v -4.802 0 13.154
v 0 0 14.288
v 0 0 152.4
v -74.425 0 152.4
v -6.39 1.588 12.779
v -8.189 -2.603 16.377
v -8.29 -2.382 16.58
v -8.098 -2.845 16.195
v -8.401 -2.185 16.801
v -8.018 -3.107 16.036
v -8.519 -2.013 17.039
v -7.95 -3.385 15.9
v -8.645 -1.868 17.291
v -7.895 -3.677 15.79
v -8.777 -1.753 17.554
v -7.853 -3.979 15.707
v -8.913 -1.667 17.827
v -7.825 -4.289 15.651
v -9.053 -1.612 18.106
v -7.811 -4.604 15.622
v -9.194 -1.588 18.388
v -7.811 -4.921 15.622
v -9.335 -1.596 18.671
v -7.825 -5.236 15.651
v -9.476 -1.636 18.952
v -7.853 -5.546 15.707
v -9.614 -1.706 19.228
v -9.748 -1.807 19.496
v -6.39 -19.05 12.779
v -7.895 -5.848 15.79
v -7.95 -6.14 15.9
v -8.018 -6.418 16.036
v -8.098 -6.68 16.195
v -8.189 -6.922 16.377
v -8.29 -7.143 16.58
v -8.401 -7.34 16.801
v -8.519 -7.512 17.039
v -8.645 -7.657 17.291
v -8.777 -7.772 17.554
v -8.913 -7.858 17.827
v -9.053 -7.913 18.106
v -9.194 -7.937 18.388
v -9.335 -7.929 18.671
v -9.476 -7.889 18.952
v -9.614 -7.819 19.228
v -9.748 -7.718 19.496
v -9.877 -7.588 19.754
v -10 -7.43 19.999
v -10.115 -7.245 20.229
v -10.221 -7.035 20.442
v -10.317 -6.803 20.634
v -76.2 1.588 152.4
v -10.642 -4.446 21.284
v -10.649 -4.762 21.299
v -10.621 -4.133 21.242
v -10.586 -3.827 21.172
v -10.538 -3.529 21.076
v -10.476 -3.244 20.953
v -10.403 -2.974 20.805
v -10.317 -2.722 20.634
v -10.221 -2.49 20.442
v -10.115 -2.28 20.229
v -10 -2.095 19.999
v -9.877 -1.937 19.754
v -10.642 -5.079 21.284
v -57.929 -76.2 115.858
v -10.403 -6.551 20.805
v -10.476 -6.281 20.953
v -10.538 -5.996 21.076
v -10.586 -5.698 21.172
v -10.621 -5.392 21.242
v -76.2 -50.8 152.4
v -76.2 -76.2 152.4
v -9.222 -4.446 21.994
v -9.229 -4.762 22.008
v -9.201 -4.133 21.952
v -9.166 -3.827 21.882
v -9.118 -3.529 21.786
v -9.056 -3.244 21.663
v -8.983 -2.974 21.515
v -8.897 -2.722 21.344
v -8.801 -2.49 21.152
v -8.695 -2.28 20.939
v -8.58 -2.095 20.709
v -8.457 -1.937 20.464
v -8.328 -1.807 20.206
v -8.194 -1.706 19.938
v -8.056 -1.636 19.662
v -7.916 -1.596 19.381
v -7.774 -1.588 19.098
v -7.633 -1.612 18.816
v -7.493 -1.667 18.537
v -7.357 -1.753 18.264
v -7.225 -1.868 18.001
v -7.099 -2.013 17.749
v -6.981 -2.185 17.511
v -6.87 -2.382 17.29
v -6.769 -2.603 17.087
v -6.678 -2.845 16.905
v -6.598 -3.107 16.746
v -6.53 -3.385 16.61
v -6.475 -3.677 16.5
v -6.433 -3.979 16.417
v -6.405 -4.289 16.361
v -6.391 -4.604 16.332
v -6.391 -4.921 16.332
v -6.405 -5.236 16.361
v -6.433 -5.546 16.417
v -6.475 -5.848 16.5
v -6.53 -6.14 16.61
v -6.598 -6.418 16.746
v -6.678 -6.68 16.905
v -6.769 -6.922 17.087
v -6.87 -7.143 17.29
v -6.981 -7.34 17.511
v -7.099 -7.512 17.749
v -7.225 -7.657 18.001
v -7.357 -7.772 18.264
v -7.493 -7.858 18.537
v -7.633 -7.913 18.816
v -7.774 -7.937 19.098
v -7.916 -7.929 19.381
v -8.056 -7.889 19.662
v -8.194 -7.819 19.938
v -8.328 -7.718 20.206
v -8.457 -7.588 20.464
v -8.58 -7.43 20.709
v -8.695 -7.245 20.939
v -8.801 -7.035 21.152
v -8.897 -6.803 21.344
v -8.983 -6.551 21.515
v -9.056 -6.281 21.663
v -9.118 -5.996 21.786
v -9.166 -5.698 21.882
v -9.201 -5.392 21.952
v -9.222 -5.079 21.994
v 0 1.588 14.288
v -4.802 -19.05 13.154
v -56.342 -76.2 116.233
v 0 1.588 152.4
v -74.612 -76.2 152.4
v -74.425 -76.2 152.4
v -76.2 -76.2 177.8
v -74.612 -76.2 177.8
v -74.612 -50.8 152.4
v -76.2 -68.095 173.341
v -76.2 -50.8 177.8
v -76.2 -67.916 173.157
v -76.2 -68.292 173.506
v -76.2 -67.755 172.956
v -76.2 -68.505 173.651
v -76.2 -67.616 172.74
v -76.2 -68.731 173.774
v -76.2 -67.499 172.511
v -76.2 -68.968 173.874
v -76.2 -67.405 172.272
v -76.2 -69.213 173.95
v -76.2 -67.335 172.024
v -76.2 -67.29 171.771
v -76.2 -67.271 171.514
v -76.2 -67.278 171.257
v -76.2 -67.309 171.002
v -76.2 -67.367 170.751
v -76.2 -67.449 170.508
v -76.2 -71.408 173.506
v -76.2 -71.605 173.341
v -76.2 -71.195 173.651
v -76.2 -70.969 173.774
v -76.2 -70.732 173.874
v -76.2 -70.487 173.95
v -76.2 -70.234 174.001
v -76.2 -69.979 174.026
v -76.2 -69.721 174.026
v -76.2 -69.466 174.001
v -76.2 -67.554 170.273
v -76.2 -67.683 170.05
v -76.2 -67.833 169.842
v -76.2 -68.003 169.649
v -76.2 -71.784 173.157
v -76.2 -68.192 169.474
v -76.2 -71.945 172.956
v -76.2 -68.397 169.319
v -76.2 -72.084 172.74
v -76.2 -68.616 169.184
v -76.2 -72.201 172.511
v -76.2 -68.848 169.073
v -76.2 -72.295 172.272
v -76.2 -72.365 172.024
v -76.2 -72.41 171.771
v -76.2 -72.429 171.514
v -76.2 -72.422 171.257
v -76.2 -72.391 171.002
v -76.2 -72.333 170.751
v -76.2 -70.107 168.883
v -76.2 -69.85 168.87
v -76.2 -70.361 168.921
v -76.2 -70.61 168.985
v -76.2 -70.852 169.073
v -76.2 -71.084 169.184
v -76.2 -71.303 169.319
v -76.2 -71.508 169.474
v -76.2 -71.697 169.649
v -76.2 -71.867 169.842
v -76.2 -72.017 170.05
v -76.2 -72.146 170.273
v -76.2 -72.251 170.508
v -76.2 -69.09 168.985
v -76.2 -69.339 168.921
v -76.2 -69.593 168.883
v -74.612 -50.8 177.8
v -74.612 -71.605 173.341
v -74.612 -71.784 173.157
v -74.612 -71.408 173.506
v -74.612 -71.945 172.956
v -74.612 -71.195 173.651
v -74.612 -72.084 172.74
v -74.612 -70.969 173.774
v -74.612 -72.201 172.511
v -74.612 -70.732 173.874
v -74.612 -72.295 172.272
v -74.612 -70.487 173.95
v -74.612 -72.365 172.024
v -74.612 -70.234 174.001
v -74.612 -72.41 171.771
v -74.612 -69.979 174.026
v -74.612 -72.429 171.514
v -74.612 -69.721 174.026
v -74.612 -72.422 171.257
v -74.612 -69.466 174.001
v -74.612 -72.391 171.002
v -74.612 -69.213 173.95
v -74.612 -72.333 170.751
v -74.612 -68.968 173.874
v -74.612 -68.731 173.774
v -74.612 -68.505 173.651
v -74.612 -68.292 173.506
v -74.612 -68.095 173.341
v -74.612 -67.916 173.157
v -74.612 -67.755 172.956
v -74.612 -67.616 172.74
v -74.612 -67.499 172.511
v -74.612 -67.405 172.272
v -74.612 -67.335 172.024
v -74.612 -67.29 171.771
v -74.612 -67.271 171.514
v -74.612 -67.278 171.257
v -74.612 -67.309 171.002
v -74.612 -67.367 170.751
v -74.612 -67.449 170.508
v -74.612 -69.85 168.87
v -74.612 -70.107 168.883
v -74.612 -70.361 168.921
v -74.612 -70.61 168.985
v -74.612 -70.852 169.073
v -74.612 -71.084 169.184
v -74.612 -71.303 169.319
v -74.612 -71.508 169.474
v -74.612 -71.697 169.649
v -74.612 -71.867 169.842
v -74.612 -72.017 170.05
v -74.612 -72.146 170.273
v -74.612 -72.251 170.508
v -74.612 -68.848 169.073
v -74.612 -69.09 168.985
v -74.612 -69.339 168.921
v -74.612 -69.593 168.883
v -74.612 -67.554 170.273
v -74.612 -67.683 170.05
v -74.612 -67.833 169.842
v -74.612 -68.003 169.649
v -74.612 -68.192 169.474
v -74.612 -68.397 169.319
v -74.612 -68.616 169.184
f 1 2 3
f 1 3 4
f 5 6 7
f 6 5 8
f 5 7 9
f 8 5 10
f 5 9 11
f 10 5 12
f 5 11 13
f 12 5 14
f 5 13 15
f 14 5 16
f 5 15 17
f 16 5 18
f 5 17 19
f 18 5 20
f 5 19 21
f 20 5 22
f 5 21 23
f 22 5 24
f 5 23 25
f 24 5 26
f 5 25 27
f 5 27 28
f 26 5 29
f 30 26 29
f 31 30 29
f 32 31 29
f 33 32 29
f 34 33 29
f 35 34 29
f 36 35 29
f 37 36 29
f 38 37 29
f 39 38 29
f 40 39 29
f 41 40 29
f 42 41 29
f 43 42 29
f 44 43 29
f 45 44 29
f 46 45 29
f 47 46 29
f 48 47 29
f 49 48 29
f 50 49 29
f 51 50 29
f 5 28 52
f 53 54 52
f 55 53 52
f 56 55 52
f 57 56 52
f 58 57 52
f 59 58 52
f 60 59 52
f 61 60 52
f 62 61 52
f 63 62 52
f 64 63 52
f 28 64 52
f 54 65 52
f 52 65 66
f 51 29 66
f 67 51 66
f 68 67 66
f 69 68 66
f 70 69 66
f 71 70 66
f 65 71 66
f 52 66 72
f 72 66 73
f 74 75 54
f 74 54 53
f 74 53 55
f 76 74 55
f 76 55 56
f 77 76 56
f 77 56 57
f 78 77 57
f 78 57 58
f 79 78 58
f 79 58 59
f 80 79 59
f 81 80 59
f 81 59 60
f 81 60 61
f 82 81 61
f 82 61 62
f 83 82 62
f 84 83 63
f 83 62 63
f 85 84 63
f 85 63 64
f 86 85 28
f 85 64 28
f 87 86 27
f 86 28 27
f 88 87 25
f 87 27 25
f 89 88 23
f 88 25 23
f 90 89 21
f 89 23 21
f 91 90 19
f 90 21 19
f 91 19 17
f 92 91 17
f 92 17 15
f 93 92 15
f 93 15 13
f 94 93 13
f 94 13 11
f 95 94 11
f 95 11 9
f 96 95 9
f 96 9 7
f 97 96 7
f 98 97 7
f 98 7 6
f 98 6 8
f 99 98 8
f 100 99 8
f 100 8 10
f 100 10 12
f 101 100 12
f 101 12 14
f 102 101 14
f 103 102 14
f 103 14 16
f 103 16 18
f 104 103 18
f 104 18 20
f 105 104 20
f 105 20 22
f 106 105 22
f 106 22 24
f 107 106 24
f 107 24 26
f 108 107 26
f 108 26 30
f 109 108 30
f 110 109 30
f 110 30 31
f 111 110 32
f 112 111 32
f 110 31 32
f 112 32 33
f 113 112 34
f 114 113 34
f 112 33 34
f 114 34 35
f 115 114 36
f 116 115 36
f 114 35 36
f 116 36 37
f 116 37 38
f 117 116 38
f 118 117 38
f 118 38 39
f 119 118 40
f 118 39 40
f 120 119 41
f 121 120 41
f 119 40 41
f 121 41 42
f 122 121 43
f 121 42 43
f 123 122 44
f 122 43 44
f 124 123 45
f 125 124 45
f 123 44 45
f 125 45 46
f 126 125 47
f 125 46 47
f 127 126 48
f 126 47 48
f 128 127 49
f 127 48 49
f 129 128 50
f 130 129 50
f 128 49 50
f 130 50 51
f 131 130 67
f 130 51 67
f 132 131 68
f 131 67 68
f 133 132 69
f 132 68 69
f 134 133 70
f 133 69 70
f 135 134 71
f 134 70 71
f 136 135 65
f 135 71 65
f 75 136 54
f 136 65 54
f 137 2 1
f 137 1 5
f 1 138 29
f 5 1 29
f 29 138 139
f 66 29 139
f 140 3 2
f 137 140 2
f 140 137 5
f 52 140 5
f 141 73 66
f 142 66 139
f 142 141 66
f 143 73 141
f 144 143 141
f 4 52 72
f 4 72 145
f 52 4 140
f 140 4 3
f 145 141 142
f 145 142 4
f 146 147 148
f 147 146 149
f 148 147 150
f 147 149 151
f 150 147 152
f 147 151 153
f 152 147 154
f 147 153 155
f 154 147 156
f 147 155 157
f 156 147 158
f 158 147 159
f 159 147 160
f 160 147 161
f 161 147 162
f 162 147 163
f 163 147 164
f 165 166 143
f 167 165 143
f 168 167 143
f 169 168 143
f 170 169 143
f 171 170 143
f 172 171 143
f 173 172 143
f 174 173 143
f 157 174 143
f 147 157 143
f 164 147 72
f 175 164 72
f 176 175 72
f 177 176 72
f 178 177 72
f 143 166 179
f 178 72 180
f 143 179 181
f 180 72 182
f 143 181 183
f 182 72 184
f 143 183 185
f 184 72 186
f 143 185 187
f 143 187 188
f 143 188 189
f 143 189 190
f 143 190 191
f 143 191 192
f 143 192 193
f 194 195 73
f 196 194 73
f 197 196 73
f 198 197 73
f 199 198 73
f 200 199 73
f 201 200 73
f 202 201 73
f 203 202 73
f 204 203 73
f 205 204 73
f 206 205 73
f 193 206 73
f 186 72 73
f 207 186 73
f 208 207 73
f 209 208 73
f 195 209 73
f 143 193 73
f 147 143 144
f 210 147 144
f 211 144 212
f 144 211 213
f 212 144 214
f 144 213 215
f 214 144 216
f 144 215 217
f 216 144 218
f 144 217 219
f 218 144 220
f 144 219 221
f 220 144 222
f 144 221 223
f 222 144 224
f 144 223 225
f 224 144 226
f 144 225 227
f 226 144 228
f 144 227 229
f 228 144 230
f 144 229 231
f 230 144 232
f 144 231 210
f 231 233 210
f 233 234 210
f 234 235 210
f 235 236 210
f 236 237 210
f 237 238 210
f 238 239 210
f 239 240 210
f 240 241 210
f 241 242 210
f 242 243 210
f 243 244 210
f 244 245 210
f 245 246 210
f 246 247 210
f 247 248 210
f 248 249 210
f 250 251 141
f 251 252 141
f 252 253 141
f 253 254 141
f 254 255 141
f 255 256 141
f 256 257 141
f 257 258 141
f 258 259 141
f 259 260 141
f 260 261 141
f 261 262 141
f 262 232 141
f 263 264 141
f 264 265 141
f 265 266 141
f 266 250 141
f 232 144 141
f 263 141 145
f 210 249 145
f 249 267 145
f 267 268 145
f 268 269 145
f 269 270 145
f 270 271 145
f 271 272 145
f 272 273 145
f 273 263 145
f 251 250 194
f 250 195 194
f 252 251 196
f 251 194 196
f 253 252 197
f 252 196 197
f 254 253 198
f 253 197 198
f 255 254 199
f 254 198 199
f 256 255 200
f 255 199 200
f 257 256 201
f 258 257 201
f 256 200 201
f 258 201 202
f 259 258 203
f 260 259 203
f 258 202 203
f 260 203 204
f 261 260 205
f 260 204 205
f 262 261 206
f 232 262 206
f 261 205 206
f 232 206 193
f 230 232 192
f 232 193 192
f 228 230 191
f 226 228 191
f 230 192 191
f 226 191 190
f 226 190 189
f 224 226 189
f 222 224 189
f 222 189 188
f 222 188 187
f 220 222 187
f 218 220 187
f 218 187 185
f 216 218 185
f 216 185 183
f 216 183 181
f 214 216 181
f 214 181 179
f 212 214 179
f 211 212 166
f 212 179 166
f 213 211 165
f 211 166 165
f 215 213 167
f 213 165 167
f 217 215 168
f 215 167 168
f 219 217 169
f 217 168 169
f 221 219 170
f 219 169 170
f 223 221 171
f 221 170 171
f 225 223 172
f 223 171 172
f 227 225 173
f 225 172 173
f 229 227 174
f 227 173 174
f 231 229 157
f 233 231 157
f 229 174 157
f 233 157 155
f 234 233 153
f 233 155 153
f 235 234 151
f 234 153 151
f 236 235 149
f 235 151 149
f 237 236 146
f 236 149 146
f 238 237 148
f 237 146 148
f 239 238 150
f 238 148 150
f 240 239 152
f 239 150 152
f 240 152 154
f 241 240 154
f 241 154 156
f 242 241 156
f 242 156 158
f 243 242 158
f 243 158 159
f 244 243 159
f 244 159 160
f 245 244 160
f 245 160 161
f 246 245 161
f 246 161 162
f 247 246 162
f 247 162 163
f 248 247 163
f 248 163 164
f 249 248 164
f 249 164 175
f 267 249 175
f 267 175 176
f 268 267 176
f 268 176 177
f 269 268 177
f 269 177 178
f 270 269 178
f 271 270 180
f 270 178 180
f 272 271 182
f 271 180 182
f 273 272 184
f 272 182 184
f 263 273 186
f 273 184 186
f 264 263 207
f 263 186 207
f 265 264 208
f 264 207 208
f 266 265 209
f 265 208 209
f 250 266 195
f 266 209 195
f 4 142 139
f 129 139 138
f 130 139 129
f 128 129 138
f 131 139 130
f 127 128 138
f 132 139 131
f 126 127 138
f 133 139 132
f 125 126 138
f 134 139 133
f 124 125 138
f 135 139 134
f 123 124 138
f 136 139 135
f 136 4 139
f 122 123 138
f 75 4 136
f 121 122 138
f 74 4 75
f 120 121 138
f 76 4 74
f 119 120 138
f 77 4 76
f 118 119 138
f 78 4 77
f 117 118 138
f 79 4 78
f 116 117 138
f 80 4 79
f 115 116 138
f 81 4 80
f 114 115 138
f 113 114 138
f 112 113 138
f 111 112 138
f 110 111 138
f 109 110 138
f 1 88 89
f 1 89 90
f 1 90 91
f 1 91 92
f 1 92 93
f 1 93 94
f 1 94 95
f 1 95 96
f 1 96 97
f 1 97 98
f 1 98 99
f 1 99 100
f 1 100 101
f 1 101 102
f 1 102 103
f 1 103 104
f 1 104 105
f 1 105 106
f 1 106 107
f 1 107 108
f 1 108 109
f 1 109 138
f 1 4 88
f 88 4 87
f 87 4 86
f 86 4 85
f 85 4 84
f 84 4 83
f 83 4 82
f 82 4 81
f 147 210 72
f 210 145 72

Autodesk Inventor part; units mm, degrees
ref_plane "YZ Plane" through (0, 0, 0) normal (1, 0, 0) x (0, 1, 0)
ref_plane "XZ Plane" through (0, 0, 0) normal (0, 1, 0) x (-1, 0, 0)
ref_plane "XY Plane" through (0, 0, 0) normal (0, 0, 1) x (1, 0, 0)
sketch "Sketch1" plane through (0, 0, 0) normal (0, 1, 0) x (-1, 0, 0)
  line L0 (0, 0) -> (76.2, 152.4)
  line L1 (76.2, 152.4) -> (0, 152.4)
  line L2 (0, 152.4) -> (0, 0)
  dimension "d0" = 76.2
  dimension "d1" = 152.4
extrude "Extrusion1" add sketch "Sketch1" along normal blind 1.5875
sketch "Sketch2" plane through (0, 0, 0) normal (0, -1, 0) x (1, 0, 0)
  line L0 (-76.2, 152.4) -> (0, 152.4) projected
  line L1 (-74.4251, 152.4) -> (-3.175, 9.8998)
  line L2 (-3.175, 9.8998) -> (-4.5949, 9.1898)
  line L3 (0, 0) -> (-76.2, 152.4) projected
  line L4 (0, 0) -> (-76.2, 152.4) projected
  line L5 (0, 152.4) -> (0, 0) projected
  dimension "d4" = 1.5875
  dimension "d5" = 3.175
extrude "Extrusion2" add sketch "Sketch2" along normal blind 76.2 contours L0 L1 L2 L3
chamfer "Chamfer1" distance 14.2875 angle 45 1 edges at (0, 0.7937, 0)
chamfer "Chamfer2" distance 57.15 angle 63 1 edges at (-5.5958, -76.2, 12.9665)
sketch "Sketch4" plane through (-76.2, 1.5875, 152.4) normal (0, 0, 1) x (1, 0, 0)
  line L0 (0, 0) -> (1.5875, 0)
  line L1 (0, -77.7875) -> (18.2708, -77.7875) projected
  line L2 (0, -77.7875) -> (1.5875, -77.7875)
  line L3 (1.5875, -77.7875) -> (1.5875, -52.3875)
  line L4 (1.5875, -52.3875) -> (0, -52.3875)
  line L5 (0, -52.3875) -> (0, -77.7875)
  point P0 (76.2, -1.5875)
  dimension "d22" = 1.5875
  dimension "d23" = 25.4
extrude "Extrusion4" add sketch "Sketch4" along normal blind 25.4
sketch "Sketch5" plane through (-74.6125, -76.2, 152.4) normal (1, 0, 0) x (0, 0, -1)
  line L0 (0, 0) -> (-25.4, 0) projected
  line L1 (-25.4, 25.4) -> (-25.4, 0) projected
  point P0 (152.4, 76.2)
  point P1 (-19.05, 6.35)
  dimension "d24" = 6.35
  dimension "d25" = 6.35
hole "Hole1" at (-74.6125, -69.85, 171.45) direction (-1, 0, 0) diameter 5.1594 end through all
sketch "Sketch6" plane through (-6.3896, -19.05, 12.7791) normal (-0.8944272, 0, -0.4472136) x (-0.4472136, 0, 0.8944272)
  circle A0 centre (6.35, 14.2875) radius 3.175
  line L0 (0, 20.6375) -> (156.1009, 20.6375) projected
  line L1 (0, 0) -> (0, 20.6375) projected
  point P0 (-14.2875, 19.05)
  dimension "d33" = 6.35
  dimension "d34" = 6.35
  dimension "d35" = 6.35
extrude "Extrusion5" cut sketch "Sketch6" against normal blind 25.4
properties part number "15102898-16-P-0312"
